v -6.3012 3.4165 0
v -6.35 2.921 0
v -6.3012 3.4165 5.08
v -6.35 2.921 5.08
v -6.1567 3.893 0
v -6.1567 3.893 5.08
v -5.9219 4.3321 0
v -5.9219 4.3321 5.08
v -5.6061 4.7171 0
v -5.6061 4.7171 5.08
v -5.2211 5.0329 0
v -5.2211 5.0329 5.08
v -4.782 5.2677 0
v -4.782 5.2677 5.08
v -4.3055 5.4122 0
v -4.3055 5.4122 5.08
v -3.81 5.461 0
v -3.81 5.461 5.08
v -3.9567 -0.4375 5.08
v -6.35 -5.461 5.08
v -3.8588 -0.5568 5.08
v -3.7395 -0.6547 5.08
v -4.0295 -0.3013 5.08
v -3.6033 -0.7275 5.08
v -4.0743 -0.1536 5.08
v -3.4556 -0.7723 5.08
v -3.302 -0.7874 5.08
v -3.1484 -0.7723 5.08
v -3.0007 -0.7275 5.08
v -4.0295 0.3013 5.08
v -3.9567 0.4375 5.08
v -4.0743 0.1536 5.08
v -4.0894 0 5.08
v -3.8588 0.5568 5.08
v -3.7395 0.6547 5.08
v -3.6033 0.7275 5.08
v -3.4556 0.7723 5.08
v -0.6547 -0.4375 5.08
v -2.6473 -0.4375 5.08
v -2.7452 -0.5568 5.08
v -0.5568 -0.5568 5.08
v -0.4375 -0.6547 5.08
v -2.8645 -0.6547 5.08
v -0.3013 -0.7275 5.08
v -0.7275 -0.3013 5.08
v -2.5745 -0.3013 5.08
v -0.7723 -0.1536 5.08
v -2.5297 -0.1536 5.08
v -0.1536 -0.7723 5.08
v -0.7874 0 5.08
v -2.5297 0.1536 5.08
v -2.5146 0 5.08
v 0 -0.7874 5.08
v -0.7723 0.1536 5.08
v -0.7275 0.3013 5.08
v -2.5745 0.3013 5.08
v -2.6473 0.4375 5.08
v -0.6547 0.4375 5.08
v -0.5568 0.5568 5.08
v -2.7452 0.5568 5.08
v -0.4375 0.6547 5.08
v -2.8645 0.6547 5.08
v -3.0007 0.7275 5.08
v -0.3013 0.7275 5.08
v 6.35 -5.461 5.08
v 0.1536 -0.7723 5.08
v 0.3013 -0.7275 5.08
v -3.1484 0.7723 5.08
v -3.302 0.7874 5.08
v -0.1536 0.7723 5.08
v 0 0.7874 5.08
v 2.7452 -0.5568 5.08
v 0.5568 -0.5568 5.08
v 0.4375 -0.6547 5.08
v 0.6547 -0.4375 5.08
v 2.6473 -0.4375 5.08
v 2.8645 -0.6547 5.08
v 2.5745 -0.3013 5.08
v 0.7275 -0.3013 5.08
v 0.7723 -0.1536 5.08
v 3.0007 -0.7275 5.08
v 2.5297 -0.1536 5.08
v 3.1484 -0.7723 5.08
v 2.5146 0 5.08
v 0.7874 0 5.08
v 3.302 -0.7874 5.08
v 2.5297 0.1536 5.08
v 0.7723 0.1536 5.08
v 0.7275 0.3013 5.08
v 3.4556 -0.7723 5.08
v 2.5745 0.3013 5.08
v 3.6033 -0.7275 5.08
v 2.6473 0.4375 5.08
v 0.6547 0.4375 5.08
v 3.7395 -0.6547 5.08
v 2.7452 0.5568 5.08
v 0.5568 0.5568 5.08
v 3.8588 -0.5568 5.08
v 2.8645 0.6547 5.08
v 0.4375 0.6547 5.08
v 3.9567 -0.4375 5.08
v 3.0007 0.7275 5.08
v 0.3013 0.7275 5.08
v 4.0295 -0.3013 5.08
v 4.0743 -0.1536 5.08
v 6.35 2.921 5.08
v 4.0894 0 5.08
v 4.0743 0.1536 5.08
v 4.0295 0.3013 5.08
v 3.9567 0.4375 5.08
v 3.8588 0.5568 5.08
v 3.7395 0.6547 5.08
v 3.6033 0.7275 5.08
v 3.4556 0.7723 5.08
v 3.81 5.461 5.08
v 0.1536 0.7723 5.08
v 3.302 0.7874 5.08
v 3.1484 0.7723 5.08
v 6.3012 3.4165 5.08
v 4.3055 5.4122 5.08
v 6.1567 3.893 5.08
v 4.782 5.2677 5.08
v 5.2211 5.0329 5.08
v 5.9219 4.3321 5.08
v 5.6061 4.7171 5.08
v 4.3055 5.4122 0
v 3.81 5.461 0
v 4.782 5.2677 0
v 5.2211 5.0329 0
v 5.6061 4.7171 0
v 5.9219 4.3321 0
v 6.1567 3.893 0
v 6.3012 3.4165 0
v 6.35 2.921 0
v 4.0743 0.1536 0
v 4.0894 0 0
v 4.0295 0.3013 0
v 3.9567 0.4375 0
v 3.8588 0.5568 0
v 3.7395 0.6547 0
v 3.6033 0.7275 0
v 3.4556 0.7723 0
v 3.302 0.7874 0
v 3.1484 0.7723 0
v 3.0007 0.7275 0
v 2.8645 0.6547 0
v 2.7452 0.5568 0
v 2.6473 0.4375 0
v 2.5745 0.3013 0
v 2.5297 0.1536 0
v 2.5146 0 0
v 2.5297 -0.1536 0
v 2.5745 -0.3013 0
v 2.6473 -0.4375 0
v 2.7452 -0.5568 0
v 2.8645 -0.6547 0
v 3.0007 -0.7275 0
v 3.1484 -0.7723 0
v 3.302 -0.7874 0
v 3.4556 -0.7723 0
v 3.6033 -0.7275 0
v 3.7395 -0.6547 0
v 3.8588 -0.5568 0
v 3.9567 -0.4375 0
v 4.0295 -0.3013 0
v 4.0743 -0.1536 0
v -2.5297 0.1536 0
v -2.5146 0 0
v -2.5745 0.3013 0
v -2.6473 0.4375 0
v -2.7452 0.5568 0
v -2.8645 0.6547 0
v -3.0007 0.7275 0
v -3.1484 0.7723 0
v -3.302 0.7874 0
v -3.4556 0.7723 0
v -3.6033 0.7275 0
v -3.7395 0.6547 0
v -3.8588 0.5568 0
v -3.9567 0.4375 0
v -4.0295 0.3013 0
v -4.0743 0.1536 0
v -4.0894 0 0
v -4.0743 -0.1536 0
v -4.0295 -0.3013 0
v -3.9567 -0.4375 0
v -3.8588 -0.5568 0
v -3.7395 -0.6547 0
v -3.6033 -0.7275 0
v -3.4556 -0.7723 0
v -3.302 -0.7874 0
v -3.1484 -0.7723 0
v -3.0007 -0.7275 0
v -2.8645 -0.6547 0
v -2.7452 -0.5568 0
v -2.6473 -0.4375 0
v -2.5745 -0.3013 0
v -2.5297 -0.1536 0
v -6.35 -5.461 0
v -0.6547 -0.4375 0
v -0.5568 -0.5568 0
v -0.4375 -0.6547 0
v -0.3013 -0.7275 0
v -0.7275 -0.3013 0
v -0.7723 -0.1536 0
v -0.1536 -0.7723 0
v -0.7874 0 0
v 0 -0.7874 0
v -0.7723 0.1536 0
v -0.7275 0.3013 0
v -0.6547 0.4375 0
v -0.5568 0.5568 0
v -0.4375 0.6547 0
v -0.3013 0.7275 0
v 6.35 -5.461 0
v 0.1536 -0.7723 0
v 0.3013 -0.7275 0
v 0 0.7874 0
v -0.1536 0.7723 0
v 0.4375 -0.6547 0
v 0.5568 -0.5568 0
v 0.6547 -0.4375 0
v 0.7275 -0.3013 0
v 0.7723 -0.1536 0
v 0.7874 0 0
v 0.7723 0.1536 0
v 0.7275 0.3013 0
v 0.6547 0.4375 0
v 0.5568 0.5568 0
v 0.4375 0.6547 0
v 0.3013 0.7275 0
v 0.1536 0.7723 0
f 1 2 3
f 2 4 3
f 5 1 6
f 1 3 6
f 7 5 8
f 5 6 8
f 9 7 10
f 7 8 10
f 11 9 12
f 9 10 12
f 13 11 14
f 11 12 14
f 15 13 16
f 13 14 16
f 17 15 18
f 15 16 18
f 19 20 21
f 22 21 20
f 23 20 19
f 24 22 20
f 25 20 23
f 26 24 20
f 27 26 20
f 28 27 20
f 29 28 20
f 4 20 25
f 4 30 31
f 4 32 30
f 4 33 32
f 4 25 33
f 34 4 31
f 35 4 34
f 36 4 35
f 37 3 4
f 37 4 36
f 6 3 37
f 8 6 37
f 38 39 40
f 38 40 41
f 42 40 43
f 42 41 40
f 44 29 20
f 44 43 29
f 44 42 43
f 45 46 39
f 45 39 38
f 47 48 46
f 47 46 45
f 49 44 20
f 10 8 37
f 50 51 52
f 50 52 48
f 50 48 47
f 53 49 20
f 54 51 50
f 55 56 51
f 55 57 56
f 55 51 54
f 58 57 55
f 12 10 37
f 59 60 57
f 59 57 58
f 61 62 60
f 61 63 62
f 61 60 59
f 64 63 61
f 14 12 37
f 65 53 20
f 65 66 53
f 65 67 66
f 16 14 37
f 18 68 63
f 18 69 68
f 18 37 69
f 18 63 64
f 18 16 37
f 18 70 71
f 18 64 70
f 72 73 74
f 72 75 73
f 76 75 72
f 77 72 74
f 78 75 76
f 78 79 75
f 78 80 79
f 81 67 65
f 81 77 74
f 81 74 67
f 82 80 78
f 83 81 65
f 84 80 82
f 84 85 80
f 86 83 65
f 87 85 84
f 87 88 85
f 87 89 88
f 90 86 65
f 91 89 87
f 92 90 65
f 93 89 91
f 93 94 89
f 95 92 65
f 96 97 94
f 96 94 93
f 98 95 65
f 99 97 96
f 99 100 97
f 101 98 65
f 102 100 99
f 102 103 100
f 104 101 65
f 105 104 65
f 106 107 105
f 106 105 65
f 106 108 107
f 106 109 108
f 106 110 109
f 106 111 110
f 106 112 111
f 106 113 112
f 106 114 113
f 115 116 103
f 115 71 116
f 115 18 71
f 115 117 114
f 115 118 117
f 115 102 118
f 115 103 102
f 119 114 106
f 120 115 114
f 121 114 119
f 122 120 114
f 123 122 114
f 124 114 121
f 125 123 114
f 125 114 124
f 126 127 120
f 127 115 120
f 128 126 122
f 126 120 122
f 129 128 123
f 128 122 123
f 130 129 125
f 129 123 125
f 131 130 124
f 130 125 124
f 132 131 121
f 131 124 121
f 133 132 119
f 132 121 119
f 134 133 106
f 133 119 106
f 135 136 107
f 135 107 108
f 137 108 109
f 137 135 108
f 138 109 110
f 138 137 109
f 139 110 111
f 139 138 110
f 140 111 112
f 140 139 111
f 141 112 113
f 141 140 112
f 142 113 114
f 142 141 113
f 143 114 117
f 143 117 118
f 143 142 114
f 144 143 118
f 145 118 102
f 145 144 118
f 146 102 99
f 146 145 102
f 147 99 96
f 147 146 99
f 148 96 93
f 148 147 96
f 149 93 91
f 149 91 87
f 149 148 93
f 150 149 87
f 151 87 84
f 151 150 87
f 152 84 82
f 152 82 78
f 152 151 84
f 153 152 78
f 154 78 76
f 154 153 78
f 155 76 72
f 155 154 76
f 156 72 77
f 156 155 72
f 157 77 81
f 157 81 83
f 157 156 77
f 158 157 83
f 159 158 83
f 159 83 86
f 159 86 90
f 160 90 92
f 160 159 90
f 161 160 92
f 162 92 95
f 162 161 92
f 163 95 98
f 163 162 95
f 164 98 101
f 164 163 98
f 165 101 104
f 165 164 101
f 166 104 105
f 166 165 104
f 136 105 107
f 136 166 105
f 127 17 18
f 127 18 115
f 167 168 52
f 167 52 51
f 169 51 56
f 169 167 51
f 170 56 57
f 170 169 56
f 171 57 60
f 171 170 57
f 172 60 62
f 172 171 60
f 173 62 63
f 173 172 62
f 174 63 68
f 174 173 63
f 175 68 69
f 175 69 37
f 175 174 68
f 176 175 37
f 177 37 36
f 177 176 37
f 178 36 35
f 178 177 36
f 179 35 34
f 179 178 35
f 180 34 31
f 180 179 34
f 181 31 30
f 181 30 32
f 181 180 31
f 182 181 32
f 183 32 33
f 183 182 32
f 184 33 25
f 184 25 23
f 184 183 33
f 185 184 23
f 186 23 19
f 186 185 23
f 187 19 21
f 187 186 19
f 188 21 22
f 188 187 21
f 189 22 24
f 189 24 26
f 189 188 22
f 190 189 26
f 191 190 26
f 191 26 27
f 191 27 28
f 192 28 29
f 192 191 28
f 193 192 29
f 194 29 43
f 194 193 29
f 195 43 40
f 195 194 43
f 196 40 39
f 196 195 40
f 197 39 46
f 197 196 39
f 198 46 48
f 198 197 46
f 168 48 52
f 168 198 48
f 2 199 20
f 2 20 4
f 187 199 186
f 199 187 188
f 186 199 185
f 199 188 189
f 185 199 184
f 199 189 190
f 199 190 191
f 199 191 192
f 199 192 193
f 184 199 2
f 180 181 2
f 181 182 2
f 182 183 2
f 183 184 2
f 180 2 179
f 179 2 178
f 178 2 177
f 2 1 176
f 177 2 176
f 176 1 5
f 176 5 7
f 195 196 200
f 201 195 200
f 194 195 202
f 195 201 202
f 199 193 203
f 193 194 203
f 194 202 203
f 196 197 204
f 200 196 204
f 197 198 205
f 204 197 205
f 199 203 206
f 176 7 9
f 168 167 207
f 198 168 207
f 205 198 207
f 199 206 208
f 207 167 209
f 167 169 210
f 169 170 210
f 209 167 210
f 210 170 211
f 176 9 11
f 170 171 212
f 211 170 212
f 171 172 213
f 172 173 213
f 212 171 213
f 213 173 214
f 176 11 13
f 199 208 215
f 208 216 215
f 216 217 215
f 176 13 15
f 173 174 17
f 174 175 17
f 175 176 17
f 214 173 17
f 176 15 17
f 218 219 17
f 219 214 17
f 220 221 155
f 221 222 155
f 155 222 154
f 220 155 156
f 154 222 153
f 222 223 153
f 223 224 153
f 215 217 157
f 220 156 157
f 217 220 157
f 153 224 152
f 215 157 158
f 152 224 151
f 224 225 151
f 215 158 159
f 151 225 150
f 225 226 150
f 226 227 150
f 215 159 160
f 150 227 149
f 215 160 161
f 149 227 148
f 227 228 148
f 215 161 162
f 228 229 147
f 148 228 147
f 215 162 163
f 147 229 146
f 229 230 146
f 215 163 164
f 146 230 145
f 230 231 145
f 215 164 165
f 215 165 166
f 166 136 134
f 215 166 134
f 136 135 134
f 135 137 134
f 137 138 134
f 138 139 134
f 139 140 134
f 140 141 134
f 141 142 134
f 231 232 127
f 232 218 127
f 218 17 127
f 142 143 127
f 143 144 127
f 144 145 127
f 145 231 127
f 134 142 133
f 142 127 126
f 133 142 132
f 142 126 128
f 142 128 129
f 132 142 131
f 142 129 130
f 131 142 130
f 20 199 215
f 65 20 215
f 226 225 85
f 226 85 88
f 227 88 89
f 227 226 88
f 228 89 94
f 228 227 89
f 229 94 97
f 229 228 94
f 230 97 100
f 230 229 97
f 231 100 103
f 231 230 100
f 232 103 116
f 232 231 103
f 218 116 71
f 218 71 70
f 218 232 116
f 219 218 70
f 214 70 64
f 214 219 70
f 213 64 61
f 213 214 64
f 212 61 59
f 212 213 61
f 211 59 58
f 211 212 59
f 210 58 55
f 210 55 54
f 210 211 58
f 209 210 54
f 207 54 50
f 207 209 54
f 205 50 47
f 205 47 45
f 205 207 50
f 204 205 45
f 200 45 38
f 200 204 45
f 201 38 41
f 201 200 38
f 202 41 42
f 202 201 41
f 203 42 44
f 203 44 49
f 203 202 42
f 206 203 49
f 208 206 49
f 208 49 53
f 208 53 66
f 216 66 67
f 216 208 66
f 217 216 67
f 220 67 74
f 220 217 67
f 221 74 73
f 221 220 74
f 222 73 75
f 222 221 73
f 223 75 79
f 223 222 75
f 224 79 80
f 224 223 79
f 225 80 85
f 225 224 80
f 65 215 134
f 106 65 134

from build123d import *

# Parameters (mm, degrees)
SKETCH1_W           = 12.7
SKETCH1_H           = 10.922
BOSS_EXTRUDE1_DEPTH = 5.08
SKETCH2_R           = 0.7874
CUT_EXTRUDE1_DEPTH  = 5.08
FILLET1_R           = 2.54


with BuildPart() as part:
    # Sketch1 → Boss-Extrude1 (new body)
    with BuildSketch(Plane.XY):
        Rectangle(SKETCH1_W, SKETCH1_H)
    extrude(amount=BOSS_EXTRUDE1_DEPTH)

    # Sketch2 → Cut-Extrude1 (cut)
    with BuildSketch(Plane.XY):
        Circle(SKETCH2_R)
        with Locations((3.302, 0)):
            Circle(SKETCH2_R)
        with Locations((-3.302, 0)):
            Circle(SKETCH2_R)
    extrude(amount=CUT_EXTRUDE1_DEPTH, mode=Mode.SUBTRACT)

    # Fillet1
    fillet1_edges = [part.edges().sort_by_distance(p)[0] for p in [
        (-6.35, 5.461, 2.54),
        (6.35, 5.461, 2.54),
    ]]
    fillet(fillet1_edges, radius=FILLET1_R)


solid = part.part
